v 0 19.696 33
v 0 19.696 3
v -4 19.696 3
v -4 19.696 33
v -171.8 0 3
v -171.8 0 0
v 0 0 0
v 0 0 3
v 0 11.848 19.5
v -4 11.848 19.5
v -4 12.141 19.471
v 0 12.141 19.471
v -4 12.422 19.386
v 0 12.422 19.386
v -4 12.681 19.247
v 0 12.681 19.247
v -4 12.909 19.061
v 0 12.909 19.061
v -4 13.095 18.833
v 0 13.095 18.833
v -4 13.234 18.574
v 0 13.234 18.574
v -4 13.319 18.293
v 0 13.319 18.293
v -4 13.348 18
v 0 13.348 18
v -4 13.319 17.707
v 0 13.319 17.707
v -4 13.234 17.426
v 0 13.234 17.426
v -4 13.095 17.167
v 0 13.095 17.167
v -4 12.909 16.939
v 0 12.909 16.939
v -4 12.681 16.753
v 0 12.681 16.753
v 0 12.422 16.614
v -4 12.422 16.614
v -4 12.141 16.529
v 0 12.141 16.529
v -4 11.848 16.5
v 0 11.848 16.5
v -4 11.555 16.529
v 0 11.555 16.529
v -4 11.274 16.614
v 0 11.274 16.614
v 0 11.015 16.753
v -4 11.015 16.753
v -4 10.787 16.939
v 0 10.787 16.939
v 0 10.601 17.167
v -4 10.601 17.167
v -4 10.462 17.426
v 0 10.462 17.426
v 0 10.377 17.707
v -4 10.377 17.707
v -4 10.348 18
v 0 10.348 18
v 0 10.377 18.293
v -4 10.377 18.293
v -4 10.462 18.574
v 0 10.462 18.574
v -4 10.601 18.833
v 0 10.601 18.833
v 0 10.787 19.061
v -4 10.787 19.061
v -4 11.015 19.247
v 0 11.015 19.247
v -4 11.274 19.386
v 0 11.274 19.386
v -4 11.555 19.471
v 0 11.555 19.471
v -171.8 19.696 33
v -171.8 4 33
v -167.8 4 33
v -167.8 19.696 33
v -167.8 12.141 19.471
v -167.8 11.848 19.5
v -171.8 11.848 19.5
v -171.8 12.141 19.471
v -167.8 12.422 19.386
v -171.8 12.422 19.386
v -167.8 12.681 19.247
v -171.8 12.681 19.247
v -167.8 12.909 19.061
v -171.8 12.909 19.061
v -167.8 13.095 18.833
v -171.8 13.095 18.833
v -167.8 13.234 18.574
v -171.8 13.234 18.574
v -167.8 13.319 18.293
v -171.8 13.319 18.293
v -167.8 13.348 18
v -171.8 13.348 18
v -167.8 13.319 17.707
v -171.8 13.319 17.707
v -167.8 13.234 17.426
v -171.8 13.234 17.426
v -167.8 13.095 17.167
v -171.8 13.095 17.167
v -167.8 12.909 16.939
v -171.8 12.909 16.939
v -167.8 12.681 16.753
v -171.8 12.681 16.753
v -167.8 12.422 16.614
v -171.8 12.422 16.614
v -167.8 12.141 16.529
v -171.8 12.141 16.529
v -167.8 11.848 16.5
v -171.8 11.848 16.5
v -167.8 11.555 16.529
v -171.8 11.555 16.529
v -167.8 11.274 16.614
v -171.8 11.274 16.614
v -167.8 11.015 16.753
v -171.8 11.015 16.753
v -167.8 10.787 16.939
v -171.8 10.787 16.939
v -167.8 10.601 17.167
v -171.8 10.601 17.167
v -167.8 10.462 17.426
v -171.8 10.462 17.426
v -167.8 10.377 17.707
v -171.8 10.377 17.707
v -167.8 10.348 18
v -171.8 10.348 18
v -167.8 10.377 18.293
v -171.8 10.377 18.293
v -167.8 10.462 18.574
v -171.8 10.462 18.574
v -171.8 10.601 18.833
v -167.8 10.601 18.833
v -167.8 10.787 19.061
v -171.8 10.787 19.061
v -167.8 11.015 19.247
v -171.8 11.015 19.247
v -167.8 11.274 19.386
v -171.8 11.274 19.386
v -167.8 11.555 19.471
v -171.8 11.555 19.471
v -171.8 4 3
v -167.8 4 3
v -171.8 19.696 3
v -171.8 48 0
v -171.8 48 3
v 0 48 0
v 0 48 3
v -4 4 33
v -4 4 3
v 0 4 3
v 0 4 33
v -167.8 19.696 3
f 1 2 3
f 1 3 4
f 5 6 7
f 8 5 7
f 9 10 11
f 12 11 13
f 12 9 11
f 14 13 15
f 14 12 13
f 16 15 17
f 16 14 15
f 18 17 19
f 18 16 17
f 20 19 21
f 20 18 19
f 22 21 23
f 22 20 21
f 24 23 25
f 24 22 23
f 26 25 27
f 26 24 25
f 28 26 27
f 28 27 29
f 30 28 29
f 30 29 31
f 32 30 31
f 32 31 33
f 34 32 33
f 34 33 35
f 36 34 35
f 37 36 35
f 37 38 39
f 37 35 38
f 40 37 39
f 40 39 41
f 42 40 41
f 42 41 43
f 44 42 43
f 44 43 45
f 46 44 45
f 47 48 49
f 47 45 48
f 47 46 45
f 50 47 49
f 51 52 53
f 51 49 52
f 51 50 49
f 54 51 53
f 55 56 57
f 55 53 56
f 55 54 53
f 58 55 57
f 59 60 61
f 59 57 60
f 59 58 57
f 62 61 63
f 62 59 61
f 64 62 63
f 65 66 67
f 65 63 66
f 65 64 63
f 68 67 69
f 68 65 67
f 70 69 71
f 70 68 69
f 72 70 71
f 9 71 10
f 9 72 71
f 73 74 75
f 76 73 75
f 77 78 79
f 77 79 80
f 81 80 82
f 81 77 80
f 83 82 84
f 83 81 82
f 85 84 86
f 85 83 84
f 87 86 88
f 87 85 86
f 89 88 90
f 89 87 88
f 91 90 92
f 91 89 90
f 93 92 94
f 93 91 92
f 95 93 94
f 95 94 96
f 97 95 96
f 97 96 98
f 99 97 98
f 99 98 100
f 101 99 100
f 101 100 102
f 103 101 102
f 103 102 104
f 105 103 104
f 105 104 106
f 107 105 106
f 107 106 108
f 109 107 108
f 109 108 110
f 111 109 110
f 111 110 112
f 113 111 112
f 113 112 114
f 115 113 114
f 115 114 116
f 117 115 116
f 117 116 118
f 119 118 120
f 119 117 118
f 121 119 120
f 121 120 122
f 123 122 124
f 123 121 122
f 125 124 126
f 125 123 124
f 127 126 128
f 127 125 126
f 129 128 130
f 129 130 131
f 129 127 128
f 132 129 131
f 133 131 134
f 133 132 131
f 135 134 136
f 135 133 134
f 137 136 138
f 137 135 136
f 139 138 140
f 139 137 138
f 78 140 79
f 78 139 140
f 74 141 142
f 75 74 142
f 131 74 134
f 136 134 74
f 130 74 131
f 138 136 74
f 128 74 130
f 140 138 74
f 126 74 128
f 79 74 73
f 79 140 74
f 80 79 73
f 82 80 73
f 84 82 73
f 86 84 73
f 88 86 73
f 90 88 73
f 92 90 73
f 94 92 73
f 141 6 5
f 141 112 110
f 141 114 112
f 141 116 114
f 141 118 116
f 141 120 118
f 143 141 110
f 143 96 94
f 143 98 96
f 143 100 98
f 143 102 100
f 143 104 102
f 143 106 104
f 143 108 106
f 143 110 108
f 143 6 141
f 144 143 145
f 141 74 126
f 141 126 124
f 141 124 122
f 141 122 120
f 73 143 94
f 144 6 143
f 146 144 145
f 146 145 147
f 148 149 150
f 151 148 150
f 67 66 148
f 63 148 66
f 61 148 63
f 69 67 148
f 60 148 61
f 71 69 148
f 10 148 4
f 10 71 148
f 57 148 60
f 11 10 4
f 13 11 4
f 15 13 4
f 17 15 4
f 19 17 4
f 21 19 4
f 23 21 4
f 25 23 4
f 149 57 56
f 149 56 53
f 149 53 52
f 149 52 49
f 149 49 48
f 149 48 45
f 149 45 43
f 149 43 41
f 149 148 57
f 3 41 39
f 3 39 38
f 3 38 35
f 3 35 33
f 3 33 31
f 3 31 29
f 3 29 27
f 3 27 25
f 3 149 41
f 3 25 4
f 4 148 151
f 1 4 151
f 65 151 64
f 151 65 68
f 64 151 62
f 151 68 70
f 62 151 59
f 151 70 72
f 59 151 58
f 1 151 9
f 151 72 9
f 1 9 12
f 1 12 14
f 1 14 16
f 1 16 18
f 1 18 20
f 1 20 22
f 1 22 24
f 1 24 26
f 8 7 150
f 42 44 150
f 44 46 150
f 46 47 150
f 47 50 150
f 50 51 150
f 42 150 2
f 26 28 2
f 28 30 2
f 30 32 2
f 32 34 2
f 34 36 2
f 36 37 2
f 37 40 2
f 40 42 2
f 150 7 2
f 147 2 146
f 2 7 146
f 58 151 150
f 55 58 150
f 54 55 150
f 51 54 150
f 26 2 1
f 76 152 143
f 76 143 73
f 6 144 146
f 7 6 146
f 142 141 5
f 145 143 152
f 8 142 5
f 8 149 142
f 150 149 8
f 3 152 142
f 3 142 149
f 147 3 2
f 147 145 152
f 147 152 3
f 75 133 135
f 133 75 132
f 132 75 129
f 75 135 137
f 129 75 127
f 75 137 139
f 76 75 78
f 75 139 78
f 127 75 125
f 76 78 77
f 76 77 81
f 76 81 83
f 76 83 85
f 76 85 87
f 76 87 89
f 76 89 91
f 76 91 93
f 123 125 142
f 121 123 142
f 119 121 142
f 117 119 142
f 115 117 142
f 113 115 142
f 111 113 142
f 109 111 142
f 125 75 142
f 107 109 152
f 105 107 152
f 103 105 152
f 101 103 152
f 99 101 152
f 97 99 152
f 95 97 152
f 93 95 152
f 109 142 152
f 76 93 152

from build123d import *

# Parameters (mm, degrees)
CROQUIS1_W              = 171.8
CROQUIS1_H              = 48
SALIENTE_EXTRUIR1_DEPTH = 3
CROQUIS2_W              = 4
CROQUIS2_H              = 44
SALIENTE_EXTRUIR2_DEPTH = 30
CORTAR_EXTRUIR1_START   = -171.8
CROQUIS3_W              = 30
CROQUIS3_H              = 28.304126214
CORTAR_EXTRUIR1_DEPTH   = 171.8
CORTAR_EXTRUIR2_START   = -171.8
CROQUIS4_R              = 1.5
CORTAR_EXTRUIR2_DEPTH   = 171.8


with BuildPart() as part:
    # Croquis1 → Saliente-Extruir1 (new body)
    with BuildSketch(Plane.XY):
        with Locations((-85.9, 24)):
            Rectangle(CROQUIS1_W, CROQUIS1_H)
    extrude(amount=SALIENTE_EXTRUIR1_DEPTH)

    # Croquis2 → Saliente-Extruir2 (add)
    with BuildSketch(Plane.XY.offset(3)):
        with Locations((-169.8, 26)):
            Rectangle(CROQUIS2_W, CROQUIS2_H)
        with Locations((-2, 26)):
            Rectangle(CROQUIS2_W, CROQUIS2_H)
    extrude(amount=SALIENTE_EXTRUIR2_DEPTH)

    # Croquis3 → Cortar-Extruir1 (cut)
    with BuildSketch(Plane.ZY.offset(171.8).offset(CORTAR_EXTRUIR1_START)):
        with Locations((18, 33.847936893)):
            Rectangle(CROQUIS3_W, CROQUIS3_H)
    extrude(amount=CORTAR_EXTRUIR1_DEPTH, mode=Mode.SUBTRACT)

    # Croquis4 → Cortar-Extruir2 (cut)
    with BuildSketch(Plane.ZY.offset(171.8).offset(CORTAR_EXTRUIR2_START)):
        with Locations((18, 11.847936893)):
            Circle(CROQUIS4_R)
    extrude(amount=CORTAR_EXTRUIR2_DEPTH, mode=Mode.SUBTRACT)


solid = part.part
